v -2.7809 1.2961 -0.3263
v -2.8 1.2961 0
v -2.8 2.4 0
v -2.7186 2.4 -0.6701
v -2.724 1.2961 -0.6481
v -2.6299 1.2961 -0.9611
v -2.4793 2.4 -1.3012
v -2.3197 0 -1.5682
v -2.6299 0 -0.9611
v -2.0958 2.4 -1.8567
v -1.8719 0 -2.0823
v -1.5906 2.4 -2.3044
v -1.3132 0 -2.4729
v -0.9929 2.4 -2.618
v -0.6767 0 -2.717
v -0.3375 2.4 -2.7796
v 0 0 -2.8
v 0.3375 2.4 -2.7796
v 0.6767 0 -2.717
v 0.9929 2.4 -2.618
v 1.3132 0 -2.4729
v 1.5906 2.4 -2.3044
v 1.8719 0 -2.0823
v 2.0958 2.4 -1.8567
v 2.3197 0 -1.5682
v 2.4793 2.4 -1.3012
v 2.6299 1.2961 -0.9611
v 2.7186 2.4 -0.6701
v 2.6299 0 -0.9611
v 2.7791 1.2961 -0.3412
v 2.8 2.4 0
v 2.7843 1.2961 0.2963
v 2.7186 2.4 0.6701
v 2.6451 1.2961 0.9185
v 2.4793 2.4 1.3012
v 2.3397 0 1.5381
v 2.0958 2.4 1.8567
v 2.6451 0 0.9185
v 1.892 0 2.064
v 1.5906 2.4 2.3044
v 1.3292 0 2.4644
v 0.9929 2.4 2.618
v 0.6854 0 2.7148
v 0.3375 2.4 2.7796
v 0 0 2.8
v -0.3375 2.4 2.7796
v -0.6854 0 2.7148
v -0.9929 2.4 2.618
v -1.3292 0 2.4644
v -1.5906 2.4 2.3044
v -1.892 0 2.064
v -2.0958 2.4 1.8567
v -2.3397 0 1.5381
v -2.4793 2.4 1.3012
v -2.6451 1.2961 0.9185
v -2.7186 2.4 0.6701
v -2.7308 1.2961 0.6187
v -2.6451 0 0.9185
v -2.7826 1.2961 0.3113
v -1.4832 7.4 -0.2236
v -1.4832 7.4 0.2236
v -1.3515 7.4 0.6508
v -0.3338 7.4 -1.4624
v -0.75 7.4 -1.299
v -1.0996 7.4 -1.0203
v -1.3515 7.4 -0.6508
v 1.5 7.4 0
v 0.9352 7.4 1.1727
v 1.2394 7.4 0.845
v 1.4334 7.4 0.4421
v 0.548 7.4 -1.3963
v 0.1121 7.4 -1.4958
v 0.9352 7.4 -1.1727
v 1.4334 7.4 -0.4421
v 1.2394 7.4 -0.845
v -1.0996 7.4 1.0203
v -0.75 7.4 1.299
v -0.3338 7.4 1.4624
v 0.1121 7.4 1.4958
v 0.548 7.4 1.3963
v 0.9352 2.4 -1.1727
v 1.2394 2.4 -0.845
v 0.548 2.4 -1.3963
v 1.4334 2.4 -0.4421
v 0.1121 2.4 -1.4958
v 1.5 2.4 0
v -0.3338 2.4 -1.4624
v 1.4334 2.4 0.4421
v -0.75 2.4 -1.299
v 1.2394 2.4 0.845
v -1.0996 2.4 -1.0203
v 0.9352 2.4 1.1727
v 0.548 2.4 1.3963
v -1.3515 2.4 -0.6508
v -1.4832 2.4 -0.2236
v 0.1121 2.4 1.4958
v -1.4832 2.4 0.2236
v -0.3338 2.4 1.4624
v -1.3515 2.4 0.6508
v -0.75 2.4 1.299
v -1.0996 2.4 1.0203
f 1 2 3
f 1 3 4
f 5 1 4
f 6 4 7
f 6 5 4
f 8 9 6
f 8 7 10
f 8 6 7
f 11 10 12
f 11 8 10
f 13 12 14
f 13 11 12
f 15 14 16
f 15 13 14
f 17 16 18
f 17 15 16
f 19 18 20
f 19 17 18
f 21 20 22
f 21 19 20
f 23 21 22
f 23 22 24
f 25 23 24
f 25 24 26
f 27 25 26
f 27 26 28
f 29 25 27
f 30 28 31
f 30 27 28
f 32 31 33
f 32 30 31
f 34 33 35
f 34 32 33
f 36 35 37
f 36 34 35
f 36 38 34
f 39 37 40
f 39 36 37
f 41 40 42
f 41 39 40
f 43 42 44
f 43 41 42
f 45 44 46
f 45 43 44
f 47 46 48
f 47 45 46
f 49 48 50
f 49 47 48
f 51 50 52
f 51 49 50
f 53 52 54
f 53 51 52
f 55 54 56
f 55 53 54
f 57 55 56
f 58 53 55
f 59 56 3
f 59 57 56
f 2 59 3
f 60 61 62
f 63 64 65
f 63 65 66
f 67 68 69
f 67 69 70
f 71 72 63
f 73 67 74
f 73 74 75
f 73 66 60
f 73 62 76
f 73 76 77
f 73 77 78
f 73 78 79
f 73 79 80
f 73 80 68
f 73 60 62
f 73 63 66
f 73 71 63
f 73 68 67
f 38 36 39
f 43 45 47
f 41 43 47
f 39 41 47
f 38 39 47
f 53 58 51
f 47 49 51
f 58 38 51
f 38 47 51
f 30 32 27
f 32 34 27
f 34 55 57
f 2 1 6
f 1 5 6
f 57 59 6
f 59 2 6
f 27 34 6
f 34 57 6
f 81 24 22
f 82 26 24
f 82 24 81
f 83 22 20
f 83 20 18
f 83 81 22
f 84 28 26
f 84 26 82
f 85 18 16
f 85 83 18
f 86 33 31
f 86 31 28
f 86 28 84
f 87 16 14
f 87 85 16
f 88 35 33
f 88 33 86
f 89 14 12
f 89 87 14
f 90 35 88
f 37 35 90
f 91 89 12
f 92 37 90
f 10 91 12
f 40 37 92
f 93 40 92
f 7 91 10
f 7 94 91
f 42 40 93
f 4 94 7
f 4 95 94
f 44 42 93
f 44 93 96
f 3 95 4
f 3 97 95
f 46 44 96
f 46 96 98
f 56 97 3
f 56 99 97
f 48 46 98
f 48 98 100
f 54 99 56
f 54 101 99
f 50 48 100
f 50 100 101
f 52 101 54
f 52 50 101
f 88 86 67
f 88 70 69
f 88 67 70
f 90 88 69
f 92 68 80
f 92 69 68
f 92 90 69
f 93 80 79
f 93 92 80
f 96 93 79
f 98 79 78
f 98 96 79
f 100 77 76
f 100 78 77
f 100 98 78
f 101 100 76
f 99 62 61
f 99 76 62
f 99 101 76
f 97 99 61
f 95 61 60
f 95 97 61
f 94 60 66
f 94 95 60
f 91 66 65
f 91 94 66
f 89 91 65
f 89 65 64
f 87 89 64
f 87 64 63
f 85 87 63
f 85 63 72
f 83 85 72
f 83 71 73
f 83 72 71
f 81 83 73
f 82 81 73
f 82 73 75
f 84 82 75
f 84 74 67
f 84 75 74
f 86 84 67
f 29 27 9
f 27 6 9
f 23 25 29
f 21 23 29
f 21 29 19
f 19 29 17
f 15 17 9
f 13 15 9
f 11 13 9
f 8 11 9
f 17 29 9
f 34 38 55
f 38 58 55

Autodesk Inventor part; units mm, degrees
ref_plane "YZ Plane" through (0, 0, 0) normal (1, 0, 0) x (0, 1, 0)
ref_plane "XZ Plane" through (0, 0, 0) normal (0, 1, 0) x (-1, 0, 0)
ref_plane "XY Plane" through (0, 0, 0) normal (0, 0, 1) x (1, 0, 0)
sketch "Esboço1" plane through (0, 0, 0) normal (0, 1, 0) x (-1, 0, 0)
  circle A0 centre (0, 0) radius 2.8
  dimension "d0" = 5.6
extrude "Extrusão1" add sketch "Esboço1" along normal blind 2.4
sketch "Esboço2" plane through (0, 0, 0) normal (1, 0, 0) x (0, 1, 0)
  line L0 (0, 0.9185) -> (1.2961, 0.9185)
  line L1 (1.2961, 0.9185) -> (1.2961, -0.9611)
  line L2 (1.2961, -0.9611) -> (0, -0.9611)
  line L3 (0, -0.9611) -> (0, 0.9185)
  point P0 (0, 0)
extrude "Extrusão2" cut sketch "Esboço2" along normal through all both and the other way through all
sketch "Esboço3" plane through (0, 2.4, 0) normal (0, 1, 0) x (1, 0, 0)
  circle A0 centre (0, 0) radius 2.8 projected
  circle A1 centre (0, 0) radius 1.5
  dimension "d5" = 3
extrude "Extrusão3" add sketch "Esboço3" along normal blind 5 contours A1
thread "Rosca1" size "M3x0.5" class "6g" standard "ANSI Metric M Profile" full length
properties part number "Parafuso-M3-5"
